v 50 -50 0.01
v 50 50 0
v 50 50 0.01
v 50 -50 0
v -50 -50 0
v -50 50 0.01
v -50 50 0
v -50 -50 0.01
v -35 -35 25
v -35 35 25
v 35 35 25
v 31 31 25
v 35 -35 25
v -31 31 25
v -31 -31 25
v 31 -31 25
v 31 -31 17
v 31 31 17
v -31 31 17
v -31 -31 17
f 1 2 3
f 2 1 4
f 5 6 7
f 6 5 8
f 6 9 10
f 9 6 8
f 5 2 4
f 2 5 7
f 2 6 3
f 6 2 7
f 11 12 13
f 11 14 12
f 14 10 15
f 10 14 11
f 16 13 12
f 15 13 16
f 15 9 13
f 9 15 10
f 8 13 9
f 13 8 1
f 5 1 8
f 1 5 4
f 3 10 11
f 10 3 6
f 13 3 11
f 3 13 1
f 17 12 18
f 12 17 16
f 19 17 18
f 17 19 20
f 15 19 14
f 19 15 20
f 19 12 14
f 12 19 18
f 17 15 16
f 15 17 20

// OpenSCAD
// Tapered riser block (square frustum) with top pocket
// Print orientation: large base on bed (z = 0), builds upward.

// ---- Dimensions (mm) ----
base_size    = 100;   // bottom square side length at z = 0
top_size     = 70;    // top square side length at z = height
height       = 25;    // overall block height
pocket_size  = 62;    // square pocket side length (in top face)
pocket_depth = 8;     // pocket depth from top face
eps          = 0.5;   // overcut for clean boolean cuts

$fn = 64;

// ---- Model ----
difference() {
    // Solid square frustum, centred on origin in X and Y
    hull() {
        translate([-base_size/2, -base_size/2, 0])
            cube([base_size, base_size, 0.01]);
        translate([-top_size/2, -top_size/2, height - 0.01])
            cube([top_size, top_size, 0.01]);
    }

    // Centred square pocket cut into the top face
    translate([-pocket_size/2, -pocket_size/2, height - pocket_depth])
        cube([pocket_size, pocket_size, pocket_depth + eps]);
}
